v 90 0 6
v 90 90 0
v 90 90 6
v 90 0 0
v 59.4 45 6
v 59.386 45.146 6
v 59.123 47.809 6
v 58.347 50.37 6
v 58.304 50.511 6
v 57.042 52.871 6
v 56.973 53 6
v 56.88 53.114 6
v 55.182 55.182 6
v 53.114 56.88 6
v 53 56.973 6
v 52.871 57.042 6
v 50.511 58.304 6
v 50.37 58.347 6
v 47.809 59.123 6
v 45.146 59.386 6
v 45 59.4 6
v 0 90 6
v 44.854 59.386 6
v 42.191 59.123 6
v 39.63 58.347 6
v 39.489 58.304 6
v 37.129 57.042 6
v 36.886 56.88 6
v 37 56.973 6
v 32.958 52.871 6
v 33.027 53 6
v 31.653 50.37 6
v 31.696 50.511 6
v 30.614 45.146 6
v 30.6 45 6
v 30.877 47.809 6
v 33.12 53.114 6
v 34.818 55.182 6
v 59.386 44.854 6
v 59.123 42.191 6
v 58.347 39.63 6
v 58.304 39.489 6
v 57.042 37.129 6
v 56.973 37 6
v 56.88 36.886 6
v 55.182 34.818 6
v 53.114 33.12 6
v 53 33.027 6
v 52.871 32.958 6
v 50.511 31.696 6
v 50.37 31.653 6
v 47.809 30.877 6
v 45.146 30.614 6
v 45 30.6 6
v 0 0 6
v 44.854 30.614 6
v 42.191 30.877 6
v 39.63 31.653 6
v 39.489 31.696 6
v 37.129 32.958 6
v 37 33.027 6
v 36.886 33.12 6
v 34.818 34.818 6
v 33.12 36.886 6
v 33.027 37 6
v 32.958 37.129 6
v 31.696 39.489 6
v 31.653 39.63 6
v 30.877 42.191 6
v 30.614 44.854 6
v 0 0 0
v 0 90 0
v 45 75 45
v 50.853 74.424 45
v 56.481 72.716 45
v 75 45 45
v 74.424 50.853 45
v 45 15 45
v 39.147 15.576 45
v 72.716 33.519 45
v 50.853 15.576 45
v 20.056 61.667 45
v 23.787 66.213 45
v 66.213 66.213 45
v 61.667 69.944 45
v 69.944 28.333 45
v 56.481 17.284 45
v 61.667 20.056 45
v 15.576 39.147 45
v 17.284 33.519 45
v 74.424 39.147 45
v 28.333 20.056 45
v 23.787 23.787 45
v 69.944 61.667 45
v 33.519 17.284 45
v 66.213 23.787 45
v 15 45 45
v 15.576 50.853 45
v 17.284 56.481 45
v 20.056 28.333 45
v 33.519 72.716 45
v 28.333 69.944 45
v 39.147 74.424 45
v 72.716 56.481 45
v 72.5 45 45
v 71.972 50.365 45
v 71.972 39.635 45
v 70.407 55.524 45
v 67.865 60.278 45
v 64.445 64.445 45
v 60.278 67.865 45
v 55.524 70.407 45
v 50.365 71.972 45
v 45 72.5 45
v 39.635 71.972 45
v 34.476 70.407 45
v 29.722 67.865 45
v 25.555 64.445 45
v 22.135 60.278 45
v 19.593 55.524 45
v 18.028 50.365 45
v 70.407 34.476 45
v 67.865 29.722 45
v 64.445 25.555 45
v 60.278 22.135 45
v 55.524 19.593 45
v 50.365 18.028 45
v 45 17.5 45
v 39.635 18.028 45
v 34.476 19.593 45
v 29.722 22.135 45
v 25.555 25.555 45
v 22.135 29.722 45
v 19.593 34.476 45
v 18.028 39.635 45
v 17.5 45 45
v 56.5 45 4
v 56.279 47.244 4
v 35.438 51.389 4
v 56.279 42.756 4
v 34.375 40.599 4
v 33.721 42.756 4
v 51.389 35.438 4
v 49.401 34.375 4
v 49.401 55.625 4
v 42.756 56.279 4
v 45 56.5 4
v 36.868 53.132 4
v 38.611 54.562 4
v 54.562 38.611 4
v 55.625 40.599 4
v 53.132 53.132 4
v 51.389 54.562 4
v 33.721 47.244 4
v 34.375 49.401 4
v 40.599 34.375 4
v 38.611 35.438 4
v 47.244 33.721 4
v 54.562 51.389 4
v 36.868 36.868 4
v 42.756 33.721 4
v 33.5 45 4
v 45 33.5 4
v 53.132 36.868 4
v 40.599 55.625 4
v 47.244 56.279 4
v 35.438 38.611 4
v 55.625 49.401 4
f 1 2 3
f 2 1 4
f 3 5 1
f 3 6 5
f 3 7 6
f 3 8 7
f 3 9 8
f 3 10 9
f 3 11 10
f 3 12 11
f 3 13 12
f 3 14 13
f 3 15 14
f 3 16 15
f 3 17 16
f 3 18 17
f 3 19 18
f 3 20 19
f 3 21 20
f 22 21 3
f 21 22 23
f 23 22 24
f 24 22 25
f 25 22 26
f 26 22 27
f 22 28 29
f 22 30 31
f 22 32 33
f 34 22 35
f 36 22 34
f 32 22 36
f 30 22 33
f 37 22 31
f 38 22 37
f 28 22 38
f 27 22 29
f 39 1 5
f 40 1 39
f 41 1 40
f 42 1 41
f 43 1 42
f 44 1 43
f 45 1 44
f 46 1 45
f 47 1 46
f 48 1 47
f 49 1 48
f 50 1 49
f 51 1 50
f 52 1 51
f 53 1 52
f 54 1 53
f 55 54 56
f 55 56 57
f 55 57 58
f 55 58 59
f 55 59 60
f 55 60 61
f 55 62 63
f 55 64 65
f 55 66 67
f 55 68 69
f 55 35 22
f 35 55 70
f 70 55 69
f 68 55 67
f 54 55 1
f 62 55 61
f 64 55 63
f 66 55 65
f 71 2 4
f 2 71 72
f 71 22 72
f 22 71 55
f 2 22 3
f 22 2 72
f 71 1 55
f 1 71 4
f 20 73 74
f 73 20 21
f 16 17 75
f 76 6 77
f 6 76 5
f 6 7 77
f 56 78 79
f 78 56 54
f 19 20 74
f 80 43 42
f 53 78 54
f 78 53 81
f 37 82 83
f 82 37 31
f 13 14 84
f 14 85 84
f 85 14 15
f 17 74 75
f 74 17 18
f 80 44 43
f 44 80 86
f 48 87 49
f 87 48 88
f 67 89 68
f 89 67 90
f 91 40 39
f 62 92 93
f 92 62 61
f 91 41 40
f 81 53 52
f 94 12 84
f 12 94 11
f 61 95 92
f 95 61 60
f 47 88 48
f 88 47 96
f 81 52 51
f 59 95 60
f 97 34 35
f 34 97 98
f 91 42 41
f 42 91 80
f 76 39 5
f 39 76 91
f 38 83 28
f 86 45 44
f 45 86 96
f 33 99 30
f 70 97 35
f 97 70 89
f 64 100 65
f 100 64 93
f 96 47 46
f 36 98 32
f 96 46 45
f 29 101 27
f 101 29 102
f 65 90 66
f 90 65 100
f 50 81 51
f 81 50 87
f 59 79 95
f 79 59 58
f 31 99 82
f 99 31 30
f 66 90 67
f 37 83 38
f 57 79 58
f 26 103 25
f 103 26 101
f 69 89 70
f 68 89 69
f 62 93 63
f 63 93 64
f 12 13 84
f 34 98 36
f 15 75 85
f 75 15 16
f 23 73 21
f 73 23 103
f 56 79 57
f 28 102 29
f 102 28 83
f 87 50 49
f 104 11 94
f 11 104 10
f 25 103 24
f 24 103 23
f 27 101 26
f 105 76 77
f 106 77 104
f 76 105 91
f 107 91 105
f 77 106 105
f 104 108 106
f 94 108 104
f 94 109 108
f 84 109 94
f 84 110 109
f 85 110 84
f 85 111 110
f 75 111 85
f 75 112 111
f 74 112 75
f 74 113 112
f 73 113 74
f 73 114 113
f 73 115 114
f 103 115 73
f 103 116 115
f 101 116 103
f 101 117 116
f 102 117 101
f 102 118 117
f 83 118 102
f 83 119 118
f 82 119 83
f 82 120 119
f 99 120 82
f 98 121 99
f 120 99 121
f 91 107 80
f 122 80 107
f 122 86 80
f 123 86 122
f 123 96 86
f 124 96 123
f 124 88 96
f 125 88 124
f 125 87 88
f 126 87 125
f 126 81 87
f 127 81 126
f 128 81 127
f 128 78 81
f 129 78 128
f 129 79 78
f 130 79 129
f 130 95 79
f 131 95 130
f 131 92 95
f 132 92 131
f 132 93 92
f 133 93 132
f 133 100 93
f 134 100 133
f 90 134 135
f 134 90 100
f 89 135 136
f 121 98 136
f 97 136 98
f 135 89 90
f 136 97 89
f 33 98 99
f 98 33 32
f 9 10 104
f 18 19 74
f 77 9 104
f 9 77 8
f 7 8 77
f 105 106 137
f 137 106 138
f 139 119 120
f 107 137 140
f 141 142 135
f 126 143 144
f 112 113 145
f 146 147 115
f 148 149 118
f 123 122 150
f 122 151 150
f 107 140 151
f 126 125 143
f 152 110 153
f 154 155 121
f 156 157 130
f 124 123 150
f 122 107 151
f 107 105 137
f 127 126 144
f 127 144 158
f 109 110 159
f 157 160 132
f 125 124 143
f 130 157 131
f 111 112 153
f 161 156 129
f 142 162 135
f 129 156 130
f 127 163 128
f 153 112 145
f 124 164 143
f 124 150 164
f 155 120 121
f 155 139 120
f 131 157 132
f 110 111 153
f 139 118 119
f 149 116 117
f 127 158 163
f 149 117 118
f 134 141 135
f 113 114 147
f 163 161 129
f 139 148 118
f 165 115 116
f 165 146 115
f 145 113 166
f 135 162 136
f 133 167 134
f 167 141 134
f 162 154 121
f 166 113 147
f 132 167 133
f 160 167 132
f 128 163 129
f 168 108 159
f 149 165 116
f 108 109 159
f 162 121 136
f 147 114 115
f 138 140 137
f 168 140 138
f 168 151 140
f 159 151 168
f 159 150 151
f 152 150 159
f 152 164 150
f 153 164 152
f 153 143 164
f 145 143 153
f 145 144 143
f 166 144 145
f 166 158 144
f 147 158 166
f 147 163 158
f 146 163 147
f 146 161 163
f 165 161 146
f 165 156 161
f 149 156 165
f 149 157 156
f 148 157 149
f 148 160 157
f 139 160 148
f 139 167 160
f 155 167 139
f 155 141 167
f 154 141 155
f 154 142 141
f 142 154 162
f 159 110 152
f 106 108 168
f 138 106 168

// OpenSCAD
$fn = 32;

// ----------------------------------------------------------------------
// Hopper: funnel with square flange
// ----------------------------------------------------------------------

// --- parameters (mm) ---
fl = 90;                  // flange side, X and Y
fl_t = 6;                 // flange thickness
cone_h = 40;              // cone height above the flange
top_d = 60;               // cone mouth diameter
bot_d = 28;               // cone spout diameter
wall = 2.5;               // cone wall thickness

bore_d = bot_d - 2 * wall;  // spout bore diameter
total_h = fl_t + cone_h - 1;  // overall height

difference() {
  union() {
    cube([fl, fl, fl_t]);
    translate([fl / 2, fl / 2, fl_t - 1])
      cylinder(h = cone_h, d1 = bot_d, d2 = top_d);
  }
  translate([fl / 2, fl / 2, fl_t - 2])
    cylinder(h = cone_h + 1, d1 = bore_d, d2 = top_d - 2 * wall);
}
